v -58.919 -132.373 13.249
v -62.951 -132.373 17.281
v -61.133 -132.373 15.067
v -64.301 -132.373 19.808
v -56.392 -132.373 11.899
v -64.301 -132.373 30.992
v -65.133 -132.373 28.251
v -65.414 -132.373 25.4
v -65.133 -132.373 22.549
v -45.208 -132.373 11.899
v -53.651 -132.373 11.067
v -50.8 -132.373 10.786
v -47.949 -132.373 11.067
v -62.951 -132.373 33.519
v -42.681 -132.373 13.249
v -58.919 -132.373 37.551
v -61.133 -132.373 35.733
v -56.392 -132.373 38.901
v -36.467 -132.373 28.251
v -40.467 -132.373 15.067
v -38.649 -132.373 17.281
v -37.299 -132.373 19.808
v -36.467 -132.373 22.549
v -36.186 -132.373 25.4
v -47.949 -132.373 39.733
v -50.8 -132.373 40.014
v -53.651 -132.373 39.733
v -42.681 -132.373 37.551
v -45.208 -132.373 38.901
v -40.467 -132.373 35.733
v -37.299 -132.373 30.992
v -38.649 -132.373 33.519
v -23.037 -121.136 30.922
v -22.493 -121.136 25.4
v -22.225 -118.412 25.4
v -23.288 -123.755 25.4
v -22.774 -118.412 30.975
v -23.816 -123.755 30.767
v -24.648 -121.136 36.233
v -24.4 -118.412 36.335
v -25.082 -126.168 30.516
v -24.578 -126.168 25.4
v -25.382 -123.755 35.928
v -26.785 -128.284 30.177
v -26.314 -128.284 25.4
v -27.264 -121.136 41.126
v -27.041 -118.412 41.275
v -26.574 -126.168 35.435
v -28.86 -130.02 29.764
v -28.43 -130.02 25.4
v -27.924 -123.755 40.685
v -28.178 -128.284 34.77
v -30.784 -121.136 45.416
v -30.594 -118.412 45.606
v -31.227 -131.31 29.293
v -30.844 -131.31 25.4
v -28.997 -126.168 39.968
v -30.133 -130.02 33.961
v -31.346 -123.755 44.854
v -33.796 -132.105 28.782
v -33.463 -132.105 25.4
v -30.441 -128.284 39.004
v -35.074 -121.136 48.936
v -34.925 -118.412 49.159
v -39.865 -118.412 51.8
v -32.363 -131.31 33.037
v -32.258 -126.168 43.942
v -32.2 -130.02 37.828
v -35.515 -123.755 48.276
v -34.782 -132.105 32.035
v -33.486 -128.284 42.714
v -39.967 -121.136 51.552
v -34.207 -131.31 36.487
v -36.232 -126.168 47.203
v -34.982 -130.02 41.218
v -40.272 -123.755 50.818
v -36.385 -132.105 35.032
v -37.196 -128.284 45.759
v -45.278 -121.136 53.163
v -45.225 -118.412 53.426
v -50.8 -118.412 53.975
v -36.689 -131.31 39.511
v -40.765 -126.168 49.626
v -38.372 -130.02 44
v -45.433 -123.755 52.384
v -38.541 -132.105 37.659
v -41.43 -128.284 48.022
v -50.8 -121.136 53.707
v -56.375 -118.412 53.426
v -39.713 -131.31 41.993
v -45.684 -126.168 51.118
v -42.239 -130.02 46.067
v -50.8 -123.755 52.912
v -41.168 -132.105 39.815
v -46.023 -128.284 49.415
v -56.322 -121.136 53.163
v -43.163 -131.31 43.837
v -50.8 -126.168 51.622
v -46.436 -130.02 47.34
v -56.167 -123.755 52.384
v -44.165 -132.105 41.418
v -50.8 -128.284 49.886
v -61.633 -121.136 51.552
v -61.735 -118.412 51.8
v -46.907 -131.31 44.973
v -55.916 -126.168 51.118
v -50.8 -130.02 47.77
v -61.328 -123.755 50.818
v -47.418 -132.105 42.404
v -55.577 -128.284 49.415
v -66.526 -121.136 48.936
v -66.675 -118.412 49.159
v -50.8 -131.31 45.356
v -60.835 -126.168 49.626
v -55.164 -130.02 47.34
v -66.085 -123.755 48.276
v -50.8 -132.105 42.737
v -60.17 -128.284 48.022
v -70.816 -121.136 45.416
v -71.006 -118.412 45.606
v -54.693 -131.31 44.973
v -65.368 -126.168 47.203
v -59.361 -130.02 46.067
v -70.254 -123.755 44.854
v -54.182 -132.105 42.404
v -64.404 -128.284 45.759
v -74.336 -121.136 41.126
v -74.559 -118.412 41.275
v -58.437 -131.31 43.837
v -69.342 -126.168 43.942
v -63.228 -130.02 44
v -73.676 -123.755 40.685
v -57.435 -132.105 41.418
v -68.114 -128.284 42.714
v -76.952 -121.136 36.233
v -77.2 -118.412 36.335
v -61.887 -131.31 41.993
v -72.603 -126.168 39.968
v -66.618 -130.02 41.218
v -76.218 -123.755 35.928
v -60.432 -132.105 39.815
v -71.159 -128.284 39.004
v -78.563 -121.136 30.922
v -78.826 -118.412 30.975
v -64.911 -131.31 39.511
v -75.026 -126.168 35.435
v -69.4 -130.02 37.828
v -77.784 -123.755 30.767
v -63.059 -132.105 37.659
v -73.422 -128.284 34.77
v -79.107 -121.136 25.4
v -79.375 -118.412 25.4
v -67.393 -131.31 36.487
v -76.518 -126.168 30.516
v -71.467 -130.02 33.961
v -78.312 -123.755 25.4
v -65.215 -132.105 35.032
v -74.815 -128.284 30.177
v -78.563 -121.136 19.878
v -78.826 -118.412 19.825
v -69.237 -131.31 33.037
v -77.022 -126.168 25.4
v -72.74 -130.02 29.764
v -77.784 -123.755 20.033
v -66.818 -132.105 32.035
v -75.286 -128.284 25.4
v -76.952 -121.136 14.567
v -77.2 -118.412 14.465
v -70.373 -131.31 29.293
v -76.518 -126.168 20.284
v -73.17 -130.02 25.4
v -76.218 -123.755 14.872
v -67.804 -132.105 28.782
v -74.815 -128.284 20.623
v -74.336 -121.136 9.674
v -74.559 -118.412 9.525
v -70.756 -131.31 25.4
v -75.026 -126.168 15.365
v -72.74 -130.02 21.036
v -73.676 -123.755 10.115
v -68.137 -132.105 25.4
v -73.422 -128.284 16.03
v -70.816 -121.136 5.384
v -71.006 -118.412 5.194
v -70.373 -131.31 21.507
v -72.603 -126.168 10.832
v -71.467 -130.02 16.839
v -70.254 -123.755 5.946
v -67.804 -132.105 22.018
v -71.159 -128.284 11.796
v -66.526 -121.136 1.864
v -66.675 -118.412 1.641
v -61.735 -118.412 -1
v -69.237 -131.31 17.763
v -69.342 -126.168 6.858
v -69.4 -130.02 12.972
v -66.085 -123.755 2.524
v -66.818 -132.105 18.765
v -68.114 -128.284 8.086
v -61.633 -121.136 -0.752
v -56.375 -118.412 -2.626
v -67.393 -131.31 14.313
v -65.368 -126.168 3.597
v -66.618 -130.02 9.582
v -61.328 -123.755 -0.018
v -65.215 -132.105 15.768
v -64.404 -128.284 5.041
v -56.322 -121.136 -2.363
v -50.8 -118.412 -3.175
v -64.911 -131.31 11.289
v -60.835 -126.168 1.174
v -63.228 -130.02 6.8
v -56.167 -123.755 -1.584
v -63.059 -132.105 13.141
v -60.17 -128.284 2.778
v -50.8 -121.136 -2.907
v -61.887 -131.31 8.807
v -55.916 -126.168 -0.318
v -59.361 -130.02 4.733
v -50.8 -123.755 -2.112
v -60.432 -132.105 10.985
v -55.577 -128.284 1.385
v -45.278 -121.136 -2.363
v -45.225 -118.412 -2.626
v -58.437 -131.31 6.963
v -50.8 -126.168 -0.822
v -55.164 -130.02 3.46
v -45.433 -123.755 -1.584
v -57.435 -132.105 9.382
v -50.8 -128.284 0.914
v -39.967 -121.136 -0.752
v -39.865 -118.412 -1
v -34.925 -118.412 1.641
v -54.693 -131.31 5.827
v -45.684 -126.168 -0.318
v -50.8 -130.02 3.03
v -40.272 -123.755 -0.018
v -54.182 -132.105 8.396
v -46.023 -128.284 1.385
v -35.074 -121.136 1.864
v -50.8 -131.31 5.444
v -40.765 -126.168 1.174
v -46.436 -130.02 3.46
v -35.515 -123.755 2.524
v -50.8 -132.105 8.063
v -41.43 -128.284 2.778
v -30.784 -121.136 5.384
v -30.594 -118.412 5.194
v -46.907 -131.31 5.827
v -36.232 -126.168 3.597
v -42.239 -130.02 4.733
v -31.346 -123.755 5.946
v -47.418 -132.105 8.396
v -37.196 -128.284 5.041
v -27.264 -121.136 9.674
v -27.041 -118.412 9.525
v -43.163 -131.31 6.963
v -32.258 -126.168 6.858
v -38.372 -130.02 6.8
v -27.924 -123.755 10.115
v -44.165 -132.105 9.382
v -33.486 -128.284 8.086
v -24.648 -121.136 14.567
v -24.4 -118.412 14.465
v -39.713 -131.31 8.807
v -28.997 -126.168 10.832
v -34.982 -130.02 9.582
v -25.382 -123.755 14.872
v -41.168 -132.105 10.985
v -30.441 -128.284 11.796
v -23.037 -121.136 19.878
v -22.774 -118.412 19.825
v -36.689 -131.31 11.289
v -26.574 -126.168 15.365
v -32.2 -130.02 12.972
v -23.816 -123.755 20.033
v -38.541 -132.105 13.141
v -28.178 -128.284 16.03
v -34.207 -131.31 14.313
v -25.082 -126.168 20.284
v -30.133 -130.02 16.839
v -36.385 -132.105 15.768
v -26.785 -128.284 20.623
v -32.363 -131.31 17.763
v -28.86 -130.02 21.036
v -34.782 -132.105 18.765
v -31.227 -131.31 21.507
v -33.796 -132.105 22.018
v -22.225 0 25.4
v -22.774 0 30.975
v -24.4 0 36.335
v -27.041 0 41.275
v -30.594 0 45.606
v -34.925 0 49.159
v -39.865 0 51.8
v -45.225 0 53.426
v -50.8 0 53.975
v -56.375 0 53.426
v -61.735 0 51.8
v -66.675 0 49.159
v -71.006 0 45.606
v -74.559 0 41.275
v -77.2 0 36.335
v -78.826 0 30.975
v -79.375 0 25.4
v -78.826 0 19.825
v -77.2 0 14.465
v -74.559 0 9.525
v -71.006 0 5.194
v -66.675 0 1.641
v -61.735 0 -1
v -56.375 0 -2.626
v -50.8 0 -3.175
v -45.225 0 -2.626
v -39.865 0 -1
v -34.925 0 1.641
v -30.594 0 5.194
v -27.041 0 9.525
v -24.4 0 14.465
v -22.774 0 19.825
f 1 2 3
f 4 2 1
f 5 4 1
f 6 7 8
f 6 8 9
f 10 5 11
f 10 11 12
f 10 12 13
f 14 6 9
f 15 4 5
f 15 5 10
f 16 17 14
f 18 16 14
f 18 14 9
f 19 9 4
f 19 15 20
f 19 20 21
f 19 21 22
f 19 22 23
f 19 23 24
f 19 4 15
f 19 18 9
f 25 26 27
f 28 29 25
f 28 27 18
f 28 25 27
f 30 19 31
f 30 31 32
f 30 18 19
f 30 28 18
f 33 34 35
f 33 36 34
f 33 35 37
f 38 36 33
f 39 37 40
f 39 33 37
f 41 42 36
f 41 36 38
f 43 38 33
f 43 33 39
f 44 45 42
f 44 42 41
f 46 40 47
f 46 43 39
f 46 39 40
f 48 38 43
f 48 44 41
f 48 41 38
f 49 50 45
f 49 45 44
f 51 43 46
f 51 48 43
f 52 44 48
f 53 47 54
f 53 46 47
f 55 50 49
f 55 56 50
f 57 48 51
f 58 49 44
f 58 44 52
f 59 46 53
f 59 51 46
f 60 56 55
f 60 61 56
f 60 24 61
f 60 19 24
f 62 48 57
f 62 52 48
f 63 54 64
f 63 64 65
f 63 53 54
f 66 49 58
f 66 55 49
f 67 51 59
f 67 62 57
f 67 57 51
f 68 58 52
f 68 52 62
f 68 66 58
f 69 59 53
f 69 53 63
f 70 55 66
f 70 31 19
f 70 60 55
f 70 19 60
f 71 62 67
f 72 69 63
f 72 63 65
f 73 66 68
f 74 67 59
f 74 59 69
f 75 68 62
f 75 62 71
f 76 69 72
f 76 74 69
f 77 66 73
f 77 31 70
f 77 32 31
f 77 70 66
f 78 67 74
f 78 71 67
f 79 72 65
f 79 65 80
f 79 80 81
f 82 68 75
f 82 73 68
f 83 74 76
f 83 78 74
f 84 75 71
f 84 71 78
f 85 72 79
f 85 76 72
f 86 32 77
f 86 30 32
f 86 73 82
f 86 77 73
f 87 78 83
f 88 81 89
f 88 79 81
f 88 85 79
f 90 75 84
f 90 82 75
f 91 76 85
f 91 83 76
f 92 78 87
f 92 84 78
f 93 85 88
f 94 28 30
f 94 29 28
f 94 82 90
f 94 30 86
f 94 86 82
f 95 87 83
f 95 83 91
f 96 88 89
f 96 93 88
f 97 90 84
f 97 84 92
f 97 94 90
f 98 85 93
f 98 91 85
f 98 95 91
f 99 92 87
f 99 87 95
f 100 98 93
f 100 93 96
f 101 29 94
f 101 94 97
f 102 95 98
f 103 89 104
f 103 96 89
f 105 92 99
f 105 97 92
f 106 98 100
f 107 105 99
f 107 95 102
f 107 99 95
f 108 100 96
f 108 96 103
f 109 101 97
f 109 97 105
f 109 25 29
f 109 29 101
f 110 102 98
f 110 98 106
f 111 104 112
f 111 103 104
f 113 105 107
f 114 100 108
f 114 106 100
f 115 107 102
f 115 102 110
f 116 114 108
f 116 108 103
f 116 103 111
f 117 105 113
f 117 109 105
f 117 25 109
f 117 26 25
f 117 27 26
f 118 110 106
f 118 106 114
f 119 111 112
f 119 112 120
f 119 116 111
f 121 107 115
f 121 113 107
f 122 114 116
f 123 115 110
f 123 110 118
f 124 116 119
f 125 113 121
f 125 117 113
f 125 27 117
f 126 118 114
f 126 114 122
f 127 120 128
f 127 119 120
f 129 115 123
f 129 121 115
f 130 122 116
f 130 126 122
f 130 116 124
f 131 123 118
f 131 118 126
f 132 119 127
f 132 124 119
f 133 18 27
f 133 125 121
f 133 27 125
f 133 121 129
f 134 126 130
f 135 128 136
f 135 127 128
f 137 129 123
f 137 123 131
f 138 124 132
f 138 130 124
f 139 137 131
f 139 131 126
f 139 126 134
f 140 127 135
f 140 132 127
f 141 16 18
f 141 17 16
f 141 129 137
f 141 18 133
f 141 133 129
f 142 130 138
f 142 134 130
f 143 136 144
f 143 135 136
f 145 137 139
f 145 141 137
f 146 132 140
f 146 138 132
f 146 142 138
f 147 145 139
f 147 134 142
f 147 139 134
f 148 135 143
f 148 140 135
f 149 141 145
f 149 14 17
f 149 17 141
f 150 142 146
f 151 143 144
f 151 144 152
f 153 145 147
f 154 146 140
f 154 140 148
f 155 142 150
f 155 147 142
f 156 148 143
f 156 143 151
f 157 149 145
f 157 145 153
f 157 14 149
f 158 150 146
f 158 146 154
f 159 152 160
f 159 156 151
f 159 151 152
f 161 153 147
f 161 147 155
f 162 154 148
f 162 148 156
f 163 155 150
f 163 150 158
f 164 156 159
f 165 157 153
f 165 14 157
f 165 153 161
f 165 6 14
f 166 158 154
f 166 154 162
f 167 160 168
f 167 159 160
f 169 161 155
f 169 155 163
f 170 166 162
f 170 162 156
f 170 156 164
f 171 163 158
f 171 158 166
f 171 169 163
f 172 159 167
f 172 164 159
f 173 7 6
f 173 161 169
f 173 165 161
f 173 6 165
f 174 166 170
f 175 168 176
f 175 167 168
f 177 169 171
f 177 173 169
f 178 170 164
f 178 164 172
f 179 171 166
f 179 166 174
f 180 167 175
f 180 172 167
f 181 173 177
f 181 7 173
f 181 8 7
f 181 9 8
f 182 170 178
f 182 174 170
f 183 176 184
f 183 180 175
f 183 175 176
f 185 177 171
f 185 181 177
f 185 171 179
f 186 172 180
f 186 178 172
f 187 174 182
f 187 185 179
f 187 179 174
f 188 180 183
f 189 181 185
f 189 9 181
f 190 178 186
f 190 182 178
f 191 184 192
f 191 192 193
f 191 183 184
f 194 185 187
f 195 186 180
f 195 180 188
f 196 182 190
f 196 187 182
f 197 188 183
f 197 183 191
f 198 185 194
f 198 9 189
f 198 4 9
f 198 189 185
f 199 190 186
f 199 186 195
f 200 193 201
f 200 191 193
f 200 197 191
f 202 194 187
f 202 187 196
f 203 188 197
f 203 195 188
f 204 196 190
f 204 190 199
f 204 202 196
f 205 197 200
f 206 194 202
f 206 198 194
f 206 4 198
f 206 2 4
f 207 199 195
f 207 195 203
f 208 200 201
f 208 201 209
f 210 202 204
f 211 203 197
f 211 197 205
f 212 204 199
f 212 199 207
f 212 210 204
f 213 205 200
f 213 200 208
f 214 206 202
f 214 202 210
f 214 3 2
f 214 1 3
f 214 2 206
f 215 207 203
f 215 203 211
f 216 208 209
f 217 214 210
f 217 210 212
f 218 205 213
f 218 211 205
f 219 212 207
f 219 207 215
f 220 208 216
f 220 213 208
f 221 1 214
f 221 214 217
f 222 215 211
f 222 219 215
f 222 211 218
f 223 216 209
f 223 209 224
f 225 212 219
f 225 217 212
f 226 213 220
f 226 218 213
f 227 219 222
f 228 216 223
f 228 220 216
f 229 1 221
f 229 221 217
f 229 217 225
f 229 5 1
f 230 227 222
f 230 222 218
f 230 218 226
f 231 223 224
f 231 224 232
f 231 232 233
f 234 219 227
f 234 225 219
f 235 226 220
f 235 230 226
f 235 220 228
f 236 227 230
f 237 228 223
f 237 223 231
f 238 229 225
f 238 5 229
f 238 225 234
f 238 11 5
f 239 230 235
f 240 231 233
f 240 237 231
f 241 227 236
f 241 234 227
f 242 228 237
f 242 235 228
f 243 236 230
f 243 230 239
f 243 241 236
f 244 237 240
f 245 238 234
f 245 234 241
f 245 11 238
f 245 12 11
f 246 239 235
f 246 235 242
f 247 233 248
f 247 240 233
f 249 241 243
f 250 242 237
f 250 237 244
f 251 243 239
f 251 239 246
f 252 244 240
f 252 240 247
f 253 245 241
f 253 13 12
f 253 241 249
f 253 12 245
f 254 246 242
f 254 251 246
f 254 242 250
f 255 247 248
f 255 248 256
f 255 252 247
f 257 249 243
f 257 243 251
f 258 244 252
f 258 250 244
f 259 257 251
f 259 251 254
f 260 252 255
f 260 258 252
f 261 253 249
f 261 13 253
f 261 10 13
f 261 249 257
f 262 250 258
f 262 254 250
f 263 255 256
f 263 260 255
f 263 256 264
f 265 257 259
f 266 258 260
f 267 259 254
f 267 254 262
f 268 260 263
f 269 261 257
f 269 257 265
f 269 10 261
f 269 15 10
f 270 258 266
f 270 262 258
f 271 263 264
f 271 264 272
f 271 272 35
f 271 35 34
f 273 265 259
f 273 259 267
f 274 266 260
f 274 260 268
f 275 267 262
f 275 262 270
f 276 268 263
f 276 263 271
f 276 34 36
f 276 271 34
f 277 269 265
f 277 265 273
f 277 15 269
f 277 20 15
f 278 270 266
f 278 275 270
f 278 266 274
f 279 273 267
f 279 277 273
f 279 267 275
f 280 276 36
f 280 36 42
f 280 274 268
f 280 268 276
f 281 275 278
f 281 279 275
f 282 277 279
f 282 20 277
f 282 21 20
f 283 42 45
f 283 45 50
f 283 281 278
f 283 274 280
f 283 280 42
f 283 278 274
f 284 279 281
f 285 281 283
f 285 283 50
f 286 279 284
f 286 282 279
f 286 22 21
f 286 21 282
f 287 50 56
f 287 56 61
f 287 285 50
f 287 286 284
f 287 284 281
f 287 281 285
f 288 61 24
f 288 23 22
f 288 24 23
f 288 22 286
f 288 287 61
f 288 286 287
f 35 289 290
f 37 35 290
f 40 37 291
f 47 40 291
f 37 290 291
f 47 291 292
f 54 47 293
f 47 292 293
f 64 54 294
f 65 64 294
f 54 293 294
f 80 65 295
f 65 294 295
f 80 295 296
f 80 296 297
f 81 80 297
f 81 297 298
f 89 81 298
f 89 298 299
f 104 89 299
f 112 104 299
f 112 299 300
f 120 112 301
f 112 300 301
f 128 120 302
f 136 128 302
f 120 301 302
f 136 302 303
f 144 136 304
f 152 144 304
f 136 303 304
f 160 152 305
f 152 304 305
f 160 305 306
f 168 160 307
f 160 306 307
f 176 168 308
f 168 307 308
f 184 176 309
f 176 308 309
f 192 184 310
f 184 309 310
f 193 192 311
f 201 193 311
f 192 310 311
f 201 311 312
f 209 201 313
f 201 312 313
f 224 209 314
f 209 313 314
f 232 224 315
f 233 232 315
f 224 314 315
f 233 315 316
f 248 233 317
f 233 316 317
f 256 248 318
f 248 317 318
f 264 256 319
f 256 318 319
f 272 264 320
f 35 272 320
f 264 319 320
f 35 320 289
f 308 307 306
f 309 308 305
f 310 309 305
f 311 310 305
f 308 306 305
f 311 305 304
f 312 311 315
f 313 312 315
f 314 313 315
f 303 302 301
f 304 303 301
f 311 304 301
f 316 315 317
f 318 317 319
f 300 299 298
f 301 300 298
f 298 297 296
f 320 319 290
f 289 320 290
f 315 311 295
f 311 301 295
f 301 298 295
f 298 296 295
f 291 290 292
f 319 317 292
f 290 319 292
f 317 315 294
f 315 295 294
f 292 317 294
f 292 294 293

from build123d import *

# Parameters (mm, degrees)
F0_R     = 28.575
F1_DEPTH = 132.37323
F2_R     = 20.952387
F3_DEPTH = 17.41577
F4_R     = 13.961373


with BuildPart() as f1:
    # F0 (on Front) → F1 (new body)
    with BuildSketch(Plane.XZ):
        with Locations((-50.799999, 25.400002)):
            Circle(F0_R)
    extrude(amount=F1_DEPTH)

    # F2 (on face) → F3 (join)
    with BuildSketch(Plane.XZ.offset(132.37323)):
        with Locations((-50.799999, 25.400002)):
            Circle(F2_R)
    extrude(amount=-F3_DEPTH)

    # F4
    f4_edges = [f1.edges().sort_by_distance(p)[0] for p in [
        (-79.374999, -132.37323, 25.400002),
    ]]
    fillet(f4_edges, radius=F4_R)


solid = f1.part
